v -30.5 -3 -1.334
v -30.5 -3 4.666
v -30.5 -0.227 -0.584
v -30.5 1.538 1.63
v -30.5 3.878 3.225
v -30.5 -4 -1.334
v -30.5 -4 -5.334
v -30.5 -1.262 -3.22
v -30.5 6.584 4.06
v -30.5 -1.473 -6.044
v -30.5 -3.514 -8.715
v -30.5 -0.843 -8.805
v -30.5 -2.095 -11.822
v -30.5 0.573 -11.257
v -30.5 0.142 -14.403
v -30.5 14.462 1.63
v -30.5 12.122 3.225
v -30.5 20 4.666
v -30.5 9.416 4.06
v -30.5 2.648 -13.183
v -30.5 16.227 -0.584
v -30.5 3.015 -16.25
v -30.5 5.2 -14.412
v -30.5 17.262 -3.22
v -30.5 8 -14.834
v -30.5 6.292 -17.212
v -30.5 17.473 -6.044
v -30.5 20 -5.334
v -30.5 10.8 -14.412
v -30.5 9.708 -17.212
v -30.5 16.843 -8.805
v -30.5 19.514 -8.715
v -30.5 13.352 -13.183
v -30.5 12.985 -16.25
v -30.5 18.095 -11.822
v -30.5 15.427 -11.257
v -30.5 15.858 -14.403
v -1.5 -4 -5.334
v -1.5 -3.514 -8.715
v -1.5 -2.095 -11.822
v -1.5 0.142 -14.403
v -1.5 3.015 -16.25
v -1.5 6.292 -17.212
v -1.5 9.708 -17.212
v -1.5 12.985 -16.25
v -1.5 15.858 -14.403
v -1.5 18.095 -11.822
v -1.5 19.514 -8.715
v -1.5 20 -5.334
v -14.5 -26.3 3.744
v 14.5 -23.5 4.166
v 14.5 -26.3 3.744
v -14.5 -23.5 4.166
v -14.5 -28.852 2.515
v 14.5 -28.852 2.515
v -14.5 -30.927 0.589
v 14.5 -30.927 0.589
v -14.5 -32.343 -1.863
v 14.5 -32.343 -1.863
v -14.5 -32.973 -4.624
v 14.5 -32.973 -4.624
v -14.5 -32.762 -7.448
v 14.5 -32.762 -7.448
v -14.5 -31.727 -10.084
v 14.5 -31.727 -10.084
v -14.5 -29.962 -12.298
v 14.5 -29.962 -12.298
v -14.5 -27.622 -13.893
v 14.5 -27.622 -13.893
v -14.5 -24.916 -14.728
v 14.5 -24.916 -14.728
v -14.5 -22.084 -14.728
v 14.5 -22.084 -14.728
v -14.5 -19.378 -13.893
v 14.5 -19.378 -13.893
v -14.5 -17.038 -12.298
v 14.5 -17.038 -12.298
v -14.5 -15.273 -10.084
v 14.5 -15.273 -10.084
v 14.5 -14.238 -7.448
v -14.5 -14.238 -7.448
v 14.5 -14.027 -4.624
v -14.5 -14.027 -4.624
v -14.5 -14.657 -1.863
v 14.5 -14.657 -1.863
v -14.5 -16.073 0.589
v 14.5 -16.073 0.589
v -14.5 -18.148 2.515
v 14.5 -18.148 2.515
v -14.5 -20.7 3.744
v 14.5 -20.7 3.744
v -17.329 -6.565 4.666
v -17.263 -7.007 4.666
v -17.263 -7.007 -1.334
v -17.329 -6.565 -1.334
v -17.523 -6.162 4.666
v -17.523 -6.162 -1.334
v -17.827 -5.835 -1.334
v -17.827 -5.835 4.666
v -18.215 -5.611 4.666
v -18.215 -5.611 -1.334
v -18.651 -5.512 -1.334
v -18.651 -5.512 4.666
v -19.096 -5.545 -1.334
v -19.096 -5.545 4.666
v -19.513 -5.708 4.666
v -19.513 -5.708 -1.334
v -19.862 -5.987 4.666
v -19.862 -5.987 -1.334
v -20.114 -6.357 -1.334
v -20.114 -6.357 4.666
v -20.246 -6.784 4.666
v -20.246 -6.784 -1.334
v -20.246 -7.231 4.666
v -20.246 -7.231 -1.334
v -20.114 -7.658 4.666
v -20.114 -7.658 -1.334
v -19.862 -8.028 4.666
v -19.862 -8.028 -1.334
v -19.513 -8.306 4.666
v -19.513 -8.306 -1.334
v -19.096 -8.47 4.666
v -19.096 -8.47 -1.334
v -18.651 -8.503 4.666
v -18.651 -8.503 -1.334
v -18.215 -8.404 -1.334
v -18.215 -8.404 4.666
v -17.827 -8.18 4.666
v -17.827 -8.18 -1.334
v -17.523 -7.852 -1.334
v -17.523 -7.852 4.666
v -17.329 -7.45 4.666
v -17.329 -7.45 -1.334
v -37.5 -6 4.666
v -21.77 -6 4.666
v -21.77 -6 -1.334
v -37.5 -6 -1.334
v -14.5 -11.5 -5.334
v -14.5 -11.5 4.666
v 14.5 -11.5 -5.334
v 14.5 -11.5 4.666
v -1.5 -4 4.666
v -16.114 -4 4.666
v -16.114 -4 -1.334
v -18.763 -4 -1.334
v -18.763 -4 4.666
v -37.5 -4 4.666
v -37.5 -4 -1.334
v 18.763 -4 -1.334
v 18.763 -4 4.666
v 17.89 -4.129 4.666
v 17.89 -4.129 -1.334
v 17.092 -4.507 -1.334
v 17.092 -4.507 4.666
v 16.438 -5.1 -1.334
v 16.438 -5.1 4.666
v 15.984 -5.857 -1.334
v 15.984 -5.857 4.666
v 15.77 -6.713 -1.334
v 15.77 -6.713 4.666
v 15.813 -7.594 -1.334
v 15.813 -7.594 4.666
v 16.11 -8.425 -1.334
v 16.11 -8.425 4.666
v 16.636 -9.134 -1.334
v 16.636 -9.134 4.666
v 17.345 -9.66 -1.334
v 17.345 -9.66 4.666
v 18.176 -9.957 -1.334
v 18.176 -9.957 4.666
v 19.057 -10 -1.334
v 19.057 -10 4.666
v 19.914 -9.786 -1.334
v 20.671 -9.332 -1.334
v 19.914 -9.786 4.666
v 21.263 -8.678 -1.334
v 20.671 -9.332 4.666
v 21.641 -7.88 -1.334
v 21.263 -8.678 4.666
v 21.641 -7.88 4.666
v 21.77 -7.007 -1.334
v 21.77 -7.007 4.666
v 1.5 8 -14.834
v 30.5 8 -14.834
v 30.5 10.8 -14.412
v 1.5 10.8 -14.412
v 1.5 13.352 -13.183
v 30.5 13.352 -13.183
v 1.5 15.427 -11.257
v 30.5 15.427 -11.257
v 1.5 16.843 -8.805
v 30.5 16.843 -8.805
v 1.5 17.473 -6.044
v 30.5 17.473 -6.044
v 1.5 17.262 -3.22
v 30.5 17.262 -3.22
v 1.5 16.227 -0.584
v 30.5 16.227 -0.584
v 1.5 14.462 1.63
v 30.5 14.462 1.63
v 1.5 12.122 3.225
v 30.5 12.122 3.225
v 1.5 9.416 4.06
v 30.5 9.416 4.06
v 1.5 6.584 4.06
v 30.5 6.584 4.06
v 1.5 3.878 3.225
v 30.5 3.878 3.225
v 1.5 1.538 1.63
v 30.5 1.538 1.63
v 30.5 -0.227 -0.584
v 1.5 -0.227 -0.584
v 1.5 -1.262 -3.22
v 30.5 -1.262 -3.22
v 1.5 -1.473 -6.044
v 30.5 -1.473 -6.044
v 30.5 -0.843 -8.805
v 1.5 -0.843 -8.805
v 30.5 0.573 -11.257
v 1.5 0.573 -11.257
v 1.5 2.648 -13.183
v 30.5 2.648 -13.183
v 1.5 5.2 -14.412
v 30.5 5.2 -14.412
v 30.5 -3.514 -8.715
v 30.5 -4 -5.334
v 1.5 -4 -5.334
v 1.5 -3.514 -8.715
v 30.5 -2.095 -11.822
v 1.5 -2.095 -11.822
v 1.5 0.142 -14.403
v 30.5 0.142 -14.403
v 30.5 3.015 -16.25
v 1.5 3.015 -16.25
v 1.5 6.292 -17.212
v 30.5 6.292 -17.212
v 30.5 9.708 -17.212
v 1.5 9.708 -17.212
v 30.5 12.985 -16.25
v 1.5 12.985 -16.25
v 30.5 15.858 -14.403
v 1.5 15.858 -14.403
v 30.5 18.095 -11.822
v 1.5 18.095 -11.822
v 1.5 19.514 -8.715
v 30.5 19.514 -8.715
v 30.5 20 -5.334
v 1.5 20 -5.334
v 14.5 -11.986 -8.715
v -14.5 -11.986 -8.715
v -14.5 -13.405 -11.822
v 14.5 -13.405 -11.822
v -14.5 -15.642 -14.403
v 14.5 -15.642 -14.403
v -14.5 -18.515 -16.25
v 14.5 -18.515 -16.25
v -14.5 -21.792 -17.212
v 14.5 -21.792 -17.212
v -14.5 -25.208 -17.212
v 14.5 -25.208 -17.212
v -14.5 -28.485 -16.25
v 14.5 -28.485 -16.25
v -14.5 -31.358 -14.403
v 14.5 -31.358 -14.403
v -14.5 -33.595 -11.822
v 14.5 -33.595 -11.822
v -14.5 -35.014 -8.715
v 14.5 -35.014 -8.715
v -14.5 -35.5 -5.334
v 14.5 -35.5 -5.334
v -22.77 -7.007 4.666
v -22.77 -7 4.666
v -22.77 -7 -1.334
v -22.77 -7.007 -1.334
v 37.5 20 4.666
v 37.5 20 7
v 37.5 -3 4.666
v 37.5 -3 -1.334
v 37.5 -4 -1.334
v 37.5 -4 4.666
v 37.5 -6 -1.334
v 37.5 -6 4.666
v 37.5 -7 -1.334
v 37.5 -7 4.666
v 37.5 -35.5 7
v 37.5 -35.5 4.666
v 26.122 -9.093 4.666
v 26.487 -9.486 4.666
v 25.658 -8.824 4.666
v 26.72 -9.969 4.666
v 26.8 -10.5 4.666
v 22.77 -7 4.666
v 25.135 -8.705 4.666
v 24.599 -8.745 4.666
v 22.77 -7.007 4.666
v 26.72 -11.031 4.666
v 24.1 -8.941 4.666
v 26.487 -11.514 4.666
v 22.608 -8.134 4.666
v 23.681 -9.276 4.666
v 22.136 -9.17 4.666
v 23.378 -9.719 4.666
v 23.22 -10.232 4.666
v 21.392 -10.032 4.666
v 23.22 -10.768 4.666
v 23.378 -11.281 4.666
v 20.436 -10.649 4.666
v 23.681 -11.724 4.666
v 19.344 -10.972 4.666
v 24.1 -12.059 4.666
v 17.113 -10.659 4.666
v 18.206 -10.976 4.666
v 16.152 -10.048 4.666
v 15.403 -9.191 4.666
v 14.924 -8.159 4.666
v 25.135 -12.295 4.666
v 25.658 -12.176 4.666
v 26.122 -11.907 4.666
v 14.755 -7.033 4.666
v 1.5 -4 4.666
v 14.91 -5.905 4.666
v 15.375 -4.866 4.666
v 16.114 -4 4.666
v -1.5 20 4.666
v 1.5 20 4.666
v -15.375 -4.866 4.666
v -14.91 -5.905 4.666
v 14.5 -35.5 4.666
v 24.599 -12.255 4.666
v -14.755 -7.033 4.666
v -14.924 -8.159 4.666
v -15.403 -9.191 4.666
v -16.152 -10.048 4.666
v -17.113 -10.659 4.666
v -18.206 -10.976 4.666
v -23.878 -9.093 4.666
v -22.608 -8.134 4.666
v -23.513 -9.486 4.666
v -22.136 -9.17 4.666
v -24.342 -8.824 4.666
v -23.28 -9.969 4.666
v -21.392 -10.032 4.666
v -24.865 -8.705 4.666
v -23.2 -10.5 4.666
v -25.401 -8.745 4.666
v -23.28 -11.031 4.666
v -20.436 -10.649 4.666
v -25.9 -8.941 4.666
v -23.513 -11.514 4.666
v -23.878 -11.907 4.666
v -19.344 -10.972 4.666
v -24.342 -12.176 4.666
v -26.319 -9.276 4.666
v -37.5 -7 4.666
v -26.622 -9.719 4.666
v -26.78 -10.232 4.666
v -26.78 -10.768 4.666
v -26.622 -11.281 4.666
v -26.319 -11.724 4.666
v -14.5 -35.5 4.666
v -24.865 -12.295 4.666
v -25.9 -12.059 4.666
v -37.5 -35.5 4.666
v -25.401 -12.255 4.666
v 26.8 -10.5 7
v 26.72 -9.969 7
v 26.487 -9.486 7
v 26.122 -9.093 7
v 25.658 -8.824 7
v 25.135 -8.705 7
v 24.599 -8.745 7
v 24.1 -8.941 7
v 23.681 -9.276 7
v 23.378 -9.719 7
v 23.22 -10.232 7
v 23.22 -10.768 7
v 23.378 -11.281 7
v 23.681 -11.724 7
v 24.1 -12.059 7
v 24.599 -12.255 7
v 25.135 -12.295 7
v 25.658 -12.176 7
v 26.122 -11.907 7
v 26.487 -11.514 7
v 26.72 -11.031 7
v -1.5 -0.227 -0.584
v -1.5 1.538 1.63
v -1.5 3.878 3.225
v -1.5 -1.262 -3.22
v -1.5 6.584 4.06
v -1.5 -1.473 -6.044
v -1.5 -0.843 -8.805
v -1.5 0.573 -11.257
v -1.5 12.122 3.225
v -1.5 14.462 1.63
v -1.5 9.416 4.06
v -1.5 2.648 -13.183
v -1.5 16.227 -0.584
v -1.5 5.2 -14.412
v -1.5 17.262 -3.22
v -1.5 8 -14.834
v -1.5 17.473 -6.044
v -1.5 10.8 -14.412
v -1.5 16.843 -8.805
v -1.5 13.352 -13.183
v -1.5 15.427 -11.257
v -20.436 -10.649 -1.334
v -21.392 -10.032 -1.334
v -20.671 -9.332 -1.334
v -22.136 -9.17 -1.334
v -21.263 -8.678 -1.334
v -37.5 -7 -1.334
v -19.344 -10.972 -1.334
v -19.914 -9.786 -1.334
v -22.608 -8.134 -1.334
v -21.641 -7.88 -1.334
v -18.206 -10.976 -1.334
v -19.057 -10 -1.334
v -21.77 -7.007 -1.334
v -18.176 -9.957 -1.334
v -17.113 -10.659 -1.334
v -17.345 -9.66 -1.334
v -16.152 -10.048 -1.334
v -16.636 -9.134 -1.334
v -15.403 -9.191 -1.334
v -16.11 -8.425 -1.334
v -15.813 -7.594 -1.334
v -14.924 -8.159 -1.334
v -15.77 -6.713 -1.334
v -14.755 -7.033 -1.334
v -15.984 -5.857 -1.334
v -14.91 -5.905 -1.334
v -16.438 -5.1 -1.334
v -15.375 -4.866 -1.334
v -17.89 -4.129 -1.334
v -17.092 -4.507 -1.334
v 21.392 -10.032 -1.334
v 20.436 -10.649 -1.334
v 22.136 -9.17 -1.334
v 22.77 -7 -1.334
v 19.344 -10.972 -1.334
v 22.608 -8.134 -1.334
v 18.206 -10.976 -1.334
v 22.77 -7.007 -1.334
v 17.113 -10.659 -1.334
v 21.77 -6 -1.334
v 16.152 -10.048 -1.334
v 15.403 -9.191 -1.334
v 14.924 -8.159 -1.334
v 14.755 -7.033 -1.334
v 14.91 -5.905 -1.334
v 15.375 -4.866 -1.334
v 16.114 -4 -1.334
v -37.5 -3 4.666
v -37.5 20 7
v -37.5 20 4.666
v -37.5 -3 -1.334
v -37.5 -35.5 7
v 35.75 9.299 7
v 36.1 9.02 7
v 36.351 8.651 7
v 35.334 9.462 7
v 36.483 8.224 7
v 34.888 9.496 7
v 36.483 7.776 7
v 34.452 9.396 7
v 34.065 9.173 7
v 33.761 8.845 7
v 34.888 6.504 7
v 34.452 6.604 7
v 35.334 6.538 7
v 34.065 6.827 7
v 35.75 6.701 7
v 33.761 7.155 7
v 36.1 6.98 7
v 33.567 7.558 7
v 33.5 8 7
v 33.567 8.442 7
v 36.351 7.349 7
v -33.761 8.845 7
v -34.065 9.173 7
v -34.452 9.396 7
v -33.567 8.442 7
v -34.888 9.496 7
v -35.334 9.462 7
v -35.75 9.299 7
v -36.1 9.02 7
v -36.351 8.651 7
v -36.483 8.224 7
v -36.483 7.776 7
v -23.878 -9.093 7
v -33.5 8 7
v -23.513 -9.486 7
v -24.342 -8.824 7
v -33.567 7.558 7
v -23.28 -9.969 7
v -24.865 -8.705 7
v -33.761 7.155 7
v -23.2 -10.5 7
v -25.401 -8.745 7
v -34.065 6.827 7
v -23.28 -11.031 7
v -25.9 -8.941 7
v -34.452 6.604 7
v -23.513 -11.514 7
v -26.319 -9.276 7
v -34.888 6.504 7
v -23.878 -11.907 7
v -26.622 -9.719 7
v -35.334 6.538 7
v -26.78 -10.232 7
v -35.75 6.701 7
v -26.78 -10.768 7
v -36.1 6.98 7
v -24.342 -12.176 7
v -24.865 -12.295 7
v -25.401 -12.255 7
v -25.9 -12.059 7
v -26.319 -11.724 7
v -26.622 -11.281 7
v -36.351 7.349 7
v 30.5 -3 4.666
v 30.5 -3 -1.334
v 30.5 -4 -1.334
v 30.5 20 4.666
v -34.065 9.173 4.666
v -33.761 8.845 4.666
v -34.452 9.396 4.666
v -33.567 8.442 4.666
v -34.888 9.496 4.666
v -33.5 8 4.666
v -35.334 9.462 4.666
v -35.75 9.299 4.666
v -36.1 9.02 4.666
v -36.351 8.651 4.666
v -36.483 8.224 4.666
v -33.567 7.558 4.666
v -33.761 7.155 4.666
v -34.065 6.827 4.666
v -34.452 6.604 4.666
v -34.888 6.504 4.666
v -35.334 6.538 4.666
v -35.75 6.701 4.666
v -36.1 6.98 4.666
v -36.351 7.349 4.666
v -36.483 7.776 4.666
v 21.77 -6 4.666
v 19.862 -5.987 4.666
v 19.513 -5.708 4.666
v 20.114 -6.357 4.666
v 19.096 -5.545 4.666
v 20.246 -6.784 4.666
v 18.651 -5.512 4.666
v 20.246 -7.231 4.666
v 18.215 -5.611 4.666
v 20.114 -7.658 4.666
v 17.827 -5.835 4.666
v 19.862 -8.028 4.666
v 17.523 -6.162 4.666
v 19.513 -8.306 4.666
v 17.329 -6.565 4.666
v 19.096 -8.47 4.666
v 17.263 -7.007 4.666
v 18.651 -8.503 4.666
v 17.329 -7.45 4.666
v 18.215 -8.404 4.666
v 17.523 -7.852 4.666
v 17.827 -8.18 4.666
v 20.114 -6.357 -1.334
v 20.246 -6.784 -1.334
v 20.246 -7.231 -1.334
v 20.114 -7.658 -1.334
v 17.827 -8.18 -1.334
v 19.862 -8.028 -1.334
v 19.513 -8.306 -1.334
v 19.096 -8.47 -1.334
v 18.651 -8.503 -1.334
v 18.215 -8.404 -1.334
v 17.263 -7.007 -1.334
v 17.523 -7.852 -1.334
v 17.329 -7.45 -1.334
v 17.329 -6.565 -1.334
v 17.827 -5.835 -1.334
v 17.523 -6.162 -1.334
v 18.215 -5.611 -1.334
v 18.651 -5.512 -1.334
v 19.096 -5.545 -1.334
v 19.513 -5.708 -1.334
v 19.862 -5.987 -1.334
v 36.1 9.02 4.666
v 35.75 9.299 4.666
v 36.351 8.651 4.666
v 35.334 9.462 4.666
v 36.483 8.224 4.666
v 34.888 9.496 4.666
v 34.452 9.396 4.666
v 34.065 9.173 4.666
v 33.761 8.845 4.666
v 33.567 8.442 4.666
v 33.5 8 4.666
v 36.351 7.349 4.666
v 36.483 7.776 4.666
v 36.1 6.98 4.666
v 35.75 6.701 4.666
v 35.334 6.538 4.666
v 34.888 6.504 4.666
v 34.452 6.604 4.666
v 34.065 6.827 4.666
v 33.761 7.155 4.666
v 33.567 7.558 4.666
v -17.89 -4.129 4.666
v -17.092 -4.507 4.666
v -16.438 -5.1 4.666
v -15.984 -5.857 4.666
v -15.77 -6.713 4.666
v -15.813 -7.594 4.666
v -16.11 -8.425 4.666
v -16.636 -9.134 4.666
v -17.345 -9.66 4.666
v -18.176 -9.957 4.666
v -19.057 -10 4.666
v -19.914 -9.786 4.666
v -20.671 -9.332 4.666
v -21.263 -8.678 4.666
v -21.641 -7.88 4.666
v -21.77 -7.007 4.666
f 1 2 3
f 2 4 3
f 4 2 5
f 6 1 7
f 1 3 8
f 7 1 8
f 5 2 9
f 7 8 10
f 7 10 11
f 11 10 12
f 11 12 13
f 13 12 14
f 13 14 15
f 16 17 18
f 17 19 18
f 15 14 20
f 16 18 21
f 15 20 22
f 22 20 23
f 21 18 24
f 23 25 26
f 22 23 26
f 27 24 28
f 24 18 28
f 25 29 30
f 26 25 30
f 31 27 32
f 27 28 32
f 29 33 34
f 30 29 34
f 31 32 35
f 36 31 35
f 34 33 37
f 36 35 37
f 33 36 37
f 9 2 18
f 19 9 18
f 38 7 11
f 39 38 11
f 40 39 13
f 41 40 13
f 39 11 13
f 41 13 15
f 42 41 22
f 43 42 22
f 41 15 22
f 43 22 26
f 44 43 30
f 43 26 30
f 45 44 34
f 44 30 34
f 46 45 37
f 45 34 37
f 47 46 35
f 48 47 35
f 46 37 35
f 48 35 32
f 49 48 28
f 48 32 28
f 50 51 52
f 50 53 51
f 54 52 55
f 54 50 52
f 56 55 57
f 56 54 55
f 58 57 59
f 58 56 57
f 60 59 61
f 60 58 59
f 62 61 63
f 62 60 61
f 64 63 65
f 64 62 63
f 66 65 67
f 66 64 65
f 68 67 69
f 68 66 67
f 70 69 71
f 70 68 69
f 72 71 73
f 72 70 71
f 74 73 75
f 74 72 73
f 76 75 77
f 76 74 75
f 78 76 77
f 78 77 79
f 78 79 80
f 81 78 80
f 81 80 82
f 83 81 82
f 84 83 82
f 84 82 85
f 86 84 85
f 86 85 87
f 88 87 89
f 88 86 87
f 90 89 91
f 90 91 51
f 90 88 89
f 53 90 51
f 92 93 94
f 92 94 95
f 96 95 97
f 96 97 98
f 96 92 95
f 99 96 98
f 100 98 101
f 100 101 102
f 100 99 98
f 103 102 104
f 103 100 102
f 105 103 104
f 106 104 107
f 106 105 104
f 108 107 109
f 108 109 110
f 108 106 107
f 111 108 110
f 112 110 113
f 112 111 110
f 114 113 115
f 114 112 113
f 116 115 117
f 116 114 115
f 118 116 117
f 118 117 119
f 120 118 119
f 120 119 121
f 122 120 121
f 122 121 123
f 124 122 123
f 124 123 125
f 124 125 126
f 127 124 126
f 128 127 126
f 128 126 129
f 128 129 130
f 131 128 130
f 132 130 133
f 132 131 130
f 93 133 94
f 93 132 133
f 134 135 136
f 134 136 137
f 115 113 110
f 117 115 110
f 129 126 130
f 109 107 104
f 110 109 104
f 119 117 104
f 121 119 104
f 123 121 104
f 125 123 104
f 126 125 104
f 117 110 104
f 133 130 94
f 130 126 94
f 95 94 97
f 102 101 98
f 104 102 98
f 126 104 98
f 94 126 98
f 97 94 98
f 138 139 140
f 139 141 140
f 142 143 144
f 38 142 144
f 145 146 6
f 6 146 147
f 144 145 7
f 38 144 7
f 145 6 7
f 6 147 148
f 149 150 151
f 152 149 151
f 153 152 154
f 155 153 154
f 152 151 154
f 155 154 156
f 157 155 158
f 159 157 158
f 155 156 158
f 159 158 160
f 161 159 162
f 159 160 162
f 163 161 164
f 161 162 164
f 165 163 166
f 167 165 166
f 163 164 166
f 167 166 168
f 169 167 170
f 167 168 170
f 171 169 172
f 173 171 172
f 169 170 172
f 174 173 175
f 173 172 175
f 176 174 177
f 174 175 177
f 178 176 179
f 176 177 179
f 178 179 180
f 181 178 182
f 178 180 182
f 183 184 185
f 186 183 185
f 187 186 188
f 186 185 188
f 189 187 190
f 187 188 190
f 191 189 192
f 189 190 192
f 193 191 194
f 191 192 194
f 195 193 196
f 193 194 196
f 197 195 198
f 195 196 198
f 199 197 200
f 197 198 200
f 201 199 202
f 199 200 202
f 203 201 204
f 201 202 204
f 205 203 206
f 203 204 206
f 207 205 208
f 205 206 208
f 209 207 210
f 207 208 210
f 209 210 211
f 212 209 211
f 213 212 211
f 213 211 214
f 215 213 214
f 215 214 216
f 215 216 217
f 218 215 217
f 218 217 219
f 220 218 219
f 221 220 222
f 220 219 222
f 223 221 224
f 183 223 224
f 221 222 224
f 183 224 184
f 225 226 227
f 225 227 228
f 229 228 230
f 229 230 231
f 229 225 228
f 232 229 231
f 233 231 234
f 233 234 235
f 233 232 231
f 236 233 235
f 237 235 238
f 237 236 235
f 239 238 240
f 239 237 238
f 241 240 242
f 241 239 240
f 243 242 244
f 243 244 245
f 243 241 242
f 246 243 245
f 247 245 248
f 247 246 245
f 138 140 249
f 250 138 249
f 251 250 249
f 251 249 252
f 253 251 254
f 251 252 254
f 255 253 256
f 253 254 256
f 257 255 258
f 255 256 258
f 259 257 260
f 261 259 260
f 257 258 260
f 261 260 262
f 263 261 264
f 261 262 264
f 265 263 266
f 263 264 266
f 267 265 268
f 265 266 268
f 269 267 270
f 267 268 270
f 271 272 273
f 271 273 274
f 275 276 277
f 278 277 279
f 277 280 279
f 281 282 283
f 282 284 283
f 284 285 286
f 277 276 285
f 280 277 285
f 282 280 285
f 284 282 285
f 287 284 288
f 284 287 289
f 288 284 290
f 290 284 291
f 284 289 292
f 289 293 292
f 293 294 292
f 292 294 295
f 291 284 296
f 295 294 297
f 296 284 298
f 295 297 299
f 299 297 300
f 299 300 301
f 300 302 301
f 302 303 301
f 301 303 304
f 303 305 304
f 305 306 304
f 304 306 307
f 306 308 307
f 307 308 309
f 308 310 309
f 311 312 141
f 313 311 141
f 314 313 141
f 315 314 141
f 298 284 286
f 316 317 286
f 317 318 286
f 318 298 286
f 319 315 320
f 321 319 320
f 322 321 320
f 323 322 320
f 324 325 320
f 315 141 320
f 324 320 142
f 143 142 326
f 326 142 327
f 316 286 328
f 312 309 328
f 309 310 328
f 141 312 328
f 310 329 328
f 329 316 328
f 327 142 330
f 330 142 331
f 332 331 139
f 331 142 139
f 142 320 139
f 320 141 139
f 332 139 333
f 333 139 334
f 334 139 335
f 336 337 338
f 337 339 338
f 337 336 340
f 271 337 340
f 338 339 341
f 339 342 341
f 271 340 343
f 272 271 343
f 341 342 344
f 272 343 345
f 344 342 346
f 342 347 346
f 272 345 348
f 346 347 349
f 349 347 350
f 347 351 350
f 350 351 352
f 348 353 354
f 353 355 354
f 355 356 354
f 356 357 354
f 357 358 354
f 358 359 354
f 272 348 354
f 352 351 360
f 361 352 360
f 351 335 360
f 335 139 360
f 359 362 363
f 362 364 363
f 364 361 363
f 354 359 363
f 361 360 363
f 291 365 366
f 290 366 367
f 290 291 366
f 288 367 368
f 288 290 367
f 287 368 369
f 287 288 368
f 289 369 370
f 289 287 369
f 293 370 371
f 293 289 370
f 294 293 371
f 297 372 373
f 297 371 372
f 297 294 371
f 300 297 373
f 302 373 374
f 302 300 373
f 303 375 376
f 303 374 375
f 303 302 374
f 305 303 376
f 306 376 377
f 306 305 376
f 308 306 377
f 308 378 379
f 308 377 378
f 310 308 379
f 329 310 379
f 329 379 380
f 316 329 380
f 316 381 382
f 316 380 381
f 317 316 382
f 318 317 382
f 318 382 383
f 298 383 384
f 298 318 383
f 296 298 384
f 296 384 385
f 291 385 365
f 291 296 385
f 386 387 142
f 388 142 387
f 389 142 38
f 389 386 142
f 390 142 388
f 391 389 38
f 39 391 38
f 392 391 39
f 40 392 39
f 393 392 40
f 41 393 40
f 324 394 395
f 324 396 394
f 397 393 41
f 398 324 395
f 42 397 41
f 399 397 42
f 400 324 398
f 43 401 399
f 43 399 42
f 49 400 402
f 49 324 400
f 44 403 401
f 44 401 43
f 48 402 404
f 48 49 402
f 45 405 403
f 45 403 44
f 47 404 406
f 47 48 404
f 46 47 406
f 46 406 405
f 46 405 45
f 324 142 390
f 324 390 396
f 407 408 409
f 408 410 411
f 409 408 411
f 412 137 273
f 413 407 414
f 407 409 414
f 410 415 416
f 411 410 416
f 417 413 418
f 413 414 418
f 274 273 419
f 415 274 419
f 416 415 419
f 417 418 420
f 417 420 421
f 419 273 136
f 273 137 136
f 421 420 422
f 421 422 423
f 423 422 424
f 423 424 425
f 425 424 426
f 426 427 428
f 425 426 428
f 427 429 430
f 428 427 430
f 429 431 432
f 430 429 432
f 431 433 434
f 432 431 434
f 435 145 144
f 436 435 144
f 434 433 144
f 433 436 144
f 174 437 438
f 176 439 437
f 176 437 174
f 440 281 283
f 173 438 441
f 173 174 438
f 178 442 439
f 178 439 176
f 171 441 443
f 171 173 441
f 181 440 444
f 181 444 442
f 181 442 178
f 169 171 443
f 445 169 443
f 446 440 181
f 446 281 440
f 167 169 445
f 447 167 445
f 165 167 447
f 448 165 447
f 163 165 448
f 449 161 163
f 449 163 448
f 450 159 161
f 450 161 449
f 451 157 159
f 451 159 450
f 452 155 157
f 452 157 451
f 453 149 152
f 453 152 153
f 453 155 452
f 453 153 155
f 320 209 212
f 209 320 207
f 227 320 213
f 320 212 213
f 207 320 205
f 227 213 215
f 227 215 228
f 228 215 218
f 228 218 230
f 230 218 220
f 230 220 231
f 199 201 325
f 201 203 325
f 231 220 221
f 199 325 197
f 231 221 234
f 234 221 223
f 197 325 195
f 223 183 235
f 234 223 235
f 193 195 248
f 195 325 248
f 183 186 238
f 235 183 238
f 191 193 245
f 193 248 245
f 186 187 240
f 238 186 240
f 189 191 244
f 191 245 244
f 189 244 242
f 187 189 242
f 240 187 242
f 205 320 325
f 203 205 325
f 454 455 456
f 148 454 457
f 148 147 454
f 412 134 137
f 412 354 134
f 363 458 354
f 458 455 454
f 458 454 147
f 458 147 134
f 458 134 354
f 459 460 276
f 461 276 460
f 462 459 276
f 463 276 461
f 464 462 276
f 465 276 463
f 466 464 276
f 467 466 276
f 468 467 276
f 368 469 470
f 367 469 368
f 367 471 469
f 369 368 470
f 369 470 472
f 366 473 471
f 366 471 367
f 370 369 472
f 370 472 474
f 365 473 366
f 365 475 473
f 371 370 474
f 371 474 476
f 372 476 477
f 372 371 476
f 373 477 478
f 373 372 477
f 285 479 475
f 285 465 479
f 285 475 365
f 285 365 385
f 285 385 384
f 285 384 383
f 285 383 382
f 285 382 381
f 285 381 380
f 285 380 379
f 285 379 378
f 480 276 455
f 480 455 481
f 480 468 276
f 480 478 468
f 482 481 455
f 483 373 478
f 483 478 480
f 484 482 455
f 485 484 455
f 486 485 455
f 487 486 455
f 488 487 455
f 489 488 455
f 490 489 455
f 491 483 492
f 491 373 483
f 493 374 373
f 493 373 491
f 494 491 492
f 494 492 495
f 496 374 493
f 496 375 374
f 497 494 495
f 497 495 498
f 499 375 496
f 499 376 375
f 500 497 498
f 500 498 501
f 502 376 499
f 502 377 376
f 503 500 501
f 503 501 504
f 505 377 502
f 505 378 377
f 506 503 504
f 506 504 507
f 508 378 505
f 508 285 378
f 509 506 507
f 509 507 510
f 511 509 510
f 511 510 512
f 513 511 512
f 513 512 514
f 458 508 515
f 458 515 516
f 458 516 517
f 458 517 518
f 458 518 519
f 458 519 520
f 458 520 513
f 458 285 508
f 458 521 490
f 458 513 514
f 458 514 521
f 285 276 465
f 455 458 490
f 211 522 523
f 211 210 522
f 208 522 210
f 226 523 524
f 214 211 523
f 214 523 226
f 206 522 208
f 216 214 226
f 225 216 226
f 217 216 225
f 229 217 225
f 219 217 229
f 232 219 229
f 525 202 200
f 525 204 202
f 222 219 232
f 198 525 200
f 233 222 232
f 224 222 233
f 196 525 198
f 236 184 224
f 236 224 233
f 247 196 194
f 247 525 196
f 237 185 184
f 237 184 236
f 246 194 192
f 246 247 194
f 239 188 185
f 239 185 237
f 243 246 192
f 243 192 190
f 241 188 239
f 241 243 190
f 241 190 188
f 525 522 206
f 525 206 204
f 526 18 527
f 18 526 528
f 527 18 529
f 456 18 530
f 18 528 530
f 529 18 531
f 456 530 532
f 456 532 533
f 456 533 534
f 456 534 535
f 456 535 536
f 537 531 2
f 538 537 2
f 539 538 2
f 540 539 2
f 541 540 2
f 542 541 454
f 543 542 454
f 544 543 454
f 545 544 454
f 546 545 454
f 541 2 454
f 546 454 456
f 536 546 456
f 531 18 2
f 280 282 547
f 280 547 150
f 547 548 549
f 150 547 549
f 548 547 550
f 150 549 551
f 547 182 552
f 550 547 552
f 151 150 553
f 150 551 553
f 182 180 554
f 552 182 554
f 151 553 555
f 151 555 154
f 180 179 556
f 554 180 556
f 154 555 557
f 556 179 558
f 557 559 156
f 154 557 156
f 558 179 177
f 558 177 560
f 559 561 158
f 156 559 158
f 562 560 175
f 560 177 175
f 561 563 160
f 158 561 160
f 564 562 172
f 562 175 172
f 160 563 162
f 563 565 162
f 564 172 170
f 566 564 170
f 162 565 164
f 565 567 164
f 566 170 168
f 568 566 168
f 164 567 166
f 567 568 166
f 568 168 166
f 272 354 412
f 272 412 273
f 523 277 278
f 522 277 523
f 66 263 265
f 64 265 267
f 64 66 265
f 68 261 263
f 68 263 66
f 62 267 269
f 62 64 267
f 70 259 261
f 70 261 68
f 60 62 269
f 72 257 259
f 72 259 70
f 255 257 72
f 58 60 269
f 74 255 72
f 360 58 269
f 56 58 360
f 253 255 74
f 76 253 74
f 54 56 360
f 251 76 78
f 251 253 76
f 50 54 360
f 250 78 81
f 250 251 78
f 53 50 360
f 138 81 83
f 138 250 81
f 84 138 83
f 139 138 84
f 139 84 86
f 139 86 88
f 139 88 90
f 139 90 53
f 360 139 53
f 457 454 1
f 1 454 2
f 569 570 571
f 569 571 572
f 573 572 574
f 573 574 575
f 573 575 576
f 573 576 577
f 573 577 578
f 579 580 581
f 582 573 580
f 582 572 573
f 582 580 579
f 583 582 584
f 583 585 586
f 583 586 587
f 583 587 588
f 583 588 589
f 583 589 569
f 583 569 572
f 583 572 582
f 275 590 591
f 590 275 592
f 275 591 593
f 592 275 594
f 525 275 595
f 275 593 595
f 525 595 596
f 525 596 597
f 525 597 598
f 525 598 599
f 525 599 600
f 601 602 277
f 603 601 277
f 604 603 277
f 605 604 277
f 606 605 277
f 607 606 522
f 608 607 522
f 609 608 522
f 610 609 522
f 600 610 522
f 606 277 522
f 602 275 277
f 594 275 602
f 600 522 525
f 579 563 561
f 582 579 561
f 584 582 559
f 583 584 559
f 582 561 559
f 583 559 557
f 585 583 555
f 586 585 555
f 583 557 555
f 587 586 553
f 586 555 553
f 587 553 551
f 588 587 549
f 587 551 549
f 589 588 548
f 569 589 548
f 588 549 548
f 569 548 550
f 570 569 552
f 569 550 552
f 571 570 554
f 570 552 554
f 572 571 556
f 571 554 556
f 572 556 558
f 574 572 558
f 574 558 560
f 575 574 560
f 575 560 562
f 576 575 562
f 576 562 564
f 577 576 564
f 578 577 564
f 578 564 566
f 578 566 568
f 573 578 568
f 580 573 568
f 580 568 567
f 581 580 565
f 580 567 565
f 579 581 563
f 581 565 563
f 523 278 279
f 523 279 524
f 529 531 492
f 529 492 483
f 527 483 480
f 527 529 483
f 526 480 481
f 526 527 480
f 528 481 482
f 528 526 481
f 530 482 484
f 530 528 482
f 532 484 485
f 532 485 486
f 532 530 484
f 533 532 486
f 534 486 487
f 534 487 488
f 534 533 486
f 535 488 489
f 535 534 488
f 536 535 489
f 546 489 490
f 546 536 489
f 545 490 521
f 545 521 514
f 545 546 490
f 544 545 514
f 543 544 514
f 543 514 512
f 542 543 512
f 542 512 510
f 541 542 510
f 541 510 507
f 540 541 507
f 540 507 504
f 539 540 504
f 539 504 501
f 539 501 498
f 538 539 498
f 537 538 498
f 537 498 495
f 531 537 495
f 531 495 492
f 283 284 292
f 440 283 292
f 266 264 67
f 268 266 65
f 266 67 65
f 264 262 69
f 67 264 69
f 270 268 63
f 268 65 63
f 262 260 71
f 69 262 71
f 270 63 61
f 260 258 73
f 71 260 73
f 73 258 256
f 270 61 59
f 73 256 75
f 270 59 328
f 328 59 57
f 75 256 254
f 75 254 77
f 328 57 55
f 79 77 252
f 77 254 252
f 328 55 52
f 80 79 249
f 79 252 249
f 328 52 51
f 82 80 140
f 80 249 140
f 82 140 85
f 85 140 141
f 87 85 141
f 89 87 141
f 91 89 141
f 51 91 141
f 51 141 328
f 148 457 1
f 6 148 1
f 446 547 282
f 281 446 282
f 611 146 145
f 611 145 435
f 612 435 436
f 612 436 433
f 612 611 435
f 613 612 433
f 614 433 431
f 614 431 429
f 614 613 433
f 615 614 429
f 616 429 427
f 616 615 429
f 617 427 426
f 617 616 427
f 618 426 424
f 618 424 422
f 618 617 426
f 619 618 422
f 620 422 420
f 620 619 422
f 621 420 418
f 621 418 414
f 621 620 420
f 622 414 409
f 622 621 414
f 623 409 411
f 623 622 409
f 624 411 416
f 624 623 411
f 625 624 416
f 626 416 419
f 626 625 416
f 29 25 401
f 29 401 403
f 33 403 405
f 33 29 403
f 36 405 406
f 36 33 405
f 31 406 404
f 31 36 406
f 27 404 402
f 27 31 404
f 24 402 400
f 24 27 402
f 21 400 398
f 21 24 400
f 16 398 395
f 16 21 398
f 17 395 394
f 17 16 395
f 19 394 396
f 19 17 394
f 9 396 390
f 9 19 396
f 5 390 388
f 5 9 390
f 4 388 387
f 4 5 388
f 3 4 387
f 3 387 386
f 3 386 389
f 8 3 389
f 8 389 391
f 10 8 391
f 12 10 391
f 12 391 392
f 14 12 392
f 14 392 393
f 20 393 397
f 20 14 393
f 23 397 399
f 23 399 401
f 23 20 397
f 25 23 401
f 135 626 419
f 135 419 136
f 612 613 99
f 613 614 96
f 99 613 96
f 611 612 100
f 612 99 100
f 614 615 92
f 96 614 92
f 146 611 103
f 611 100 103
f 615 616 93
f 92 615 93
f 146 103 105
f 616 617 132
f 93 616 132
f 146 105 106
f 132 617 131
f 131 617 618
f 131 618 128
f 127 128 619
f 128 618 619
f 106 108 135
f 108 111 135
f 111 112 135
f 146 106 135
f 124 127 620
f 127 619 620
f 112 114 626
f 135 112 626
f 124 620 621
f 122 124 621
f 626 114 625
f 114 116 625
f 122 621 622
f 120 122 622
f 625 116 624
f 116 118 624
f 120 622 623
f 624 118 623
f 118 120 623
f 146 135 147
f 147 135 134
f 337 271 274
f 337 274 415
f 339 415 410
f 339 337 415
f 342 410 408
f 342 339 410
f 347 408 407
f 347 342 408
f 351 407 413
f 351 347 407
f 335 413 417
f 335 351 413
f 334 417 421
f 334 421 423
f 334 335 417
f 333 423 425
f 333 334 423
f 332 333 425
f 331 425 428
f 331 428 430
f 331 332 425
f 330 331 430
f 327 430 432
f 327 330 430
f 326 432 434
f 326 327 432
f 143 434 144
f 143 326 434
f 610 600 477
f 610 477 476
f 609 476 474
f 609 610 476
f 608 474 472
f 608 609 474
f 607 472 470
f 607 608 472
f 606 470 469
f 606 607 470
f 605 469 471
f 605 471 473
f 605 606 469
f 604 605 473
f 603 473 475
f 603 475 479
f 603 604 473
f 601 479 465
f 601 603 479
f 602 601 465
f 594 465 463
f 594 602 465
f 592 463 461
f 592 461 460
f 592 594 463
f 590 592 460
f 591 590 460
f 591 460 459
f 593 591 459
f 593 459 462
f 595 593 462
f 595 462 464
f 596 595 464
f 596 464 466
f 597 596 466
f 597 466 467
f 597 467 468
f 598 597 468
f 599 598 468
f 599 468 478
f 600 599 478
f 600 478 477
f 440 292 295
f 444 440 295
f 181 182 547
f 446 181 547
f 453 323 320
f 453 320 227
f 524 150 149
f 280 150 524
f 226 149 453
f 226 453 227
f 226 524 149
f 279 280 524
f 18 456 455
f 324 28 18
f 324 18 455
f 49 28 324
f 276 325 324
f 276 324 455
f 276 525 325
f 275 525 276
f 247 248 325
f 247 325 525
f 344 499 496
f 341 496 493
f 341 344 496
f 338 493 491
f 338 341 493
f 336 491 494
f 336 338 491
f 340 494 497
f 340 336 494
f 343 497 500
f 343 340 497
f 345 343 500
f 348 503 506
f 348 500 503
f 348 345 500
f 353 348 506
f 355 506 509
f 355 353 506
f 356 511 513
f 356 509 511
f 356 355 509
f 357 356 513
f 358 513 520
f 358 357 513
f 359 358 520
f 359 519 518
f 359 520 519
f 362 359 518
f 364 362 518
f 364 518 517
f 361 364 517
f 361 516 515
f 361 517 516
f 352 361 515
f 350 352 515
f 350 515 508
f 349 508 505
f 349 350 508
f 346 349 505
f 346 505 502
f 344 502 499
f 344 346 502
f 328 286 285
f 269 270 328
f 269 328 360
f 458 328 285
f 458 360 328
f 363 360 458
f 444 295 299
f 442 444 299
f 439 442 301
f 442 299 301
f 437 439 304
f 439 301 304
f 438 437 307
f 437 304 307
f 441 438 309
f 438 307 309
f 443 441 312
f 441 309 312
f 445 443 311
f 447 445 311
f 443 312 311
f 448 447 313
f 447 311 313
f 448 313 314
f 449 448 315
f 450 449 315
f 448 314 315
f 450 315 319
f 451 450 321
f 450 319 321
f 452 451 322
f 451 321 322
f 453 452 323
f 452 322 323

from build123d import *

# Parameters (mm, degrees)
SKETCH1_R              = 1.79994
SKETCH1_R_2            = 1.5
BOSS_EXTRUDE1_DEPTH    = 7
SKETCH2_W              = 75
SKETCH2_H              = 13.099999962
SKETCH2_R              = 2.6999438
SKETCH2_R_2            = 2.499995
SKETCH2_R_3            = 1.3498449
BOSS_EXTRUDE2_DEPTH    = 6.987999994
SKETCH2_3_R            = 2.6999438
SKETCH2_3_R_2          = 1.3498449
CUT_EXTRUDE1_DEPTH     = 2.5
SKETCH5_W              = 75
SKETCH5_H              = 13.099999962
CUT_EXTRUDE3_DEPTH     = 21.082
SKETCH6_W              = 75
SKETCH6_H              = 7
BOSS_EXTRUDE3_DEPTH    = 9.5
SKETCH8_W              = 75
SKETCH8_H              = 38.030205227
CUT_EXTRUDE4_DEPTH     = 4.666
SKETCH10_W             = 75
SKETCH10_H             = 2.334
BOSS_EXTRUDE5_DEPTH    = 25.000000038
SKETCH11_R             = 1.79994
CUT_EXTRUDE5_DEPTH     = 5
SKETCH15_W             = 44.653530321
SKETCH15_H             = 13.617301916
SKETCH15_W_2           = 11.728266088
SKETCH15_H_2           = 5.987537529
BOSS_EXTRUDE7_DEPTH    = 2.334
SKETCH16_R             = 9.5
BOSS_EXTRUDE9_DEPTH    = 29
SKETCH17_R             = 9.5
BOSS_EXTRUDE11_DEPTH   = 14.5
SKETCH18_W             = 6.99999997
SKETCH18_H             = 1
BOSS_EXTRUDE12_DEPTH   = 6
BOSS_EXTRUDE12_2_DEPTH = 6
SKETCH18_R             = 1.5
BOSS_EXTRUDE12_3_DEPTH = 6


with BuildPart() as part:
    # Sketch1 → Boss-Extrude1 (new body)
    with BuildSketch(Plane.XY):
        with BuildLine():
            Line((37.5, -10.5), (30, -10.5))
            ThreePointArc((30, -10.5), (25, -15.5), (20, -10.5))
            Line((20, -10.5), (5, -10.5))
            ThreePointArc((5, -10.5), (0, -15.5), (-5, -10.5))
            Line((-5, -10.5), (-20, -10.5))
            ThreePointArc((-20, -10.5), (-25, -15.5), (-30, -10.5))
            Line((-30, -10.5), (-37.5, -10.5))
            Line((-37.5, -10.5), (-37.5, 10.5))
            Line((-37.5, 10.5), (37.5, 10.5))
            Line((37.5, 10.5), (37.5, -10.5))
        make_face()
        with Locations((-25, -10.5)):
            Circle(SKETCH1_R, mode=Mode.SUBTRACT)
        with Locations((0, -10.5)):
            Circle(SKETCH1_R, mode=Mode.SUBTRACT)
        with Locations((25, -10.5)):
            Circle(SKETCH1_R, mode=Mode.SUBTRACT)
        with Locations((-35, 8)):
            Circle(SKETCH1_R_2, mode=Mode.SUBTRACT)
        with Locations(Location((-15, 8, 0), (0, 0, 180))):
            Circle(SKETCH1_R_2, mode=Mode.SUBTRACT)
        with Locations((-10, 8)):
            Circle(SKETCH1_R_2, mode=Mode.SUBTRACT)
        with Locations(Location((10, 8, 0), (0, 0, 180))):
            Circle(SKETCH1_R_2, mode=Mode.SUBTRACT)
        with Locations(Location((35, 8, 0), (0, 0, 180))):
            Circle(SKETCH1_R_2, mode=Mode.SUBTRACT)
        with Locations((15, 8)):
            Circle(SKETCH1_R_2, mode=Mode.SUBTRACT)
    extrude(amount=BOSS_EXTRUDE1_DEPTH)

    # Sketch2 → Boss-Extrude2 (add)
    # profile 1 of 7: a face of its own
    with BuildSketch(Plane(origin=(0, 2.24999999, 0), x_dir=(1, 0, 0), z_dir=(0, 1, 0))):
        with Locations((0, -13.549999981)):
            Rectangle(SKETCH2_W, SKETCH2_H)
        with Locations((31.0001404, -13.549999981)):
            Circle(SKETCH2_R, mode=Mode.SUBTRACT)
        with Locations((-31.0001404, -13.549999981)):
            Circle(SKETCH2_R, mode=Mode.SUBTRACT)
        with Locations(Location((-25, -13.549999981, 0), (0, 0, 180))):
            Circle(SKETCH2_R_2, mode=Mode.SUBTRACT)
        with Locations((-6.0001404, -13.549999981)):
            Circle(SKETCH2_R, mode=Mode.SUBTRACT)
        with Locations((6.0001404, -13.549999981)):
            Circle(SKETCH2_R, mode=Mode.SUBTRACT)
        with Locations(Location((0, -13.549999981, 0), (0, 0, 180))):
            Circle(SKETCH2_R_2, mode=Mode.SUBTRACT)
        with Locations((-18.9998596, -13.549999981)):
            Circle(SKETCH2_R, mode=Mode.SUBTRACT)
        with Locations(Location((25, -13.549999981, 0), (0, 0, 180))):
            Circle(SKETCH2_R_2, mode=Mode.SUBTRACT)
        with Locations((18.9998596, -13.549999981)):
            Circle(SKETCH2_R, mode=Mode.SUBTRACT)
    # profile 2 of 7: a face of its own
    with BuildSketch(Plane(origin=(0, 2.24999999, 0), x_dir=(1, 0, 0), z_dir=(0, 1, 0))):
        with Locations((-31.0001404, -13.549999981)):
            Circle(SKETCH2_R)
        with Locations(Location((-31.0001404, -13.549999981, 0), (0, 0, 180))):
            Circle(SKETCH2_R_3, mode=Mode.SUBTRACT)
    # profile 3 of 7: a face of its own
    with BuildSketch(Plane(origin=(0, 2.24999999, 0), x_dir=(1, 0, 0), z_dir=(0, 1, 0))):
        with Locations((-18.9998596, -13.549999981)):
            Circle(SKETCH2_R)
        with Locations(Location((-18.9998596, -13.549999981, 0), (0, 0, 180))):
            Circle(SKETCH2_R_3, mode=Mode.SUBTRACT)
    # profile 4 of 7: a face of its own
    with BuildSketch(Plane(origin=(0, 2.24999999, 0), x_dir=(1, 0, 0), z_dir=(0, 1, 0))):
        with Locations((-6.0001404, -13.549999981)):
            Circle(SKETCH2_R)
        with Locations(Location((-6.0001404, -13.549999981, 0), (0, 0, 180))):
            Circle(SKETCH2_R_3, mode=Mode.SUBTRACT)
    # profile 5 of 7: a face of its own
    with BuildSketch(Plane(origin=(0, 2.24999999, 0), x_dir=(1, 0, 0), z_dir=(0, 1, 0))):
        with Locations((6.0001404, -13.549999981)):
            Circle(SKETCH2_R)
        with Locations(Location((6.0001404, -13.549999981, 0), (0, 0, 180))):
            Circle(SKETCH2_R_3, mode=Mode.SUBTRACT)
    # profile 6 of 7: a face of its own
    with BuildSketch(Plane(origin=(0, 2.24999999, 0), x_dir=(1, 0, 0), z_dir=(0, 1, 0))):
        with Locations((18.9998596, -13.549999981)):
            Circle(SKETCH2_R)
        with Locations(Location((18.9998596, -13.549999981, 0), (0, 0, 180))):
            Circle(SKETCH2_R_3, mode=Mode.SUBTRACT)
    # profile 7 of 7: a face of its own
    with BuildSketch(Plane(origin=(0, 2.24999999, 0), x_dir=(1, 0, 0), z_dir=(0, 1, 0))):
        with Locations((31.0001404, -13.549999981)):
            Circle(SKETCH2_R)
        with Locations(Location((31.0001404, -13.549999981, 0), (0, 0, 180))):
            Circle(SKETCH2_R_3, mode=Mode.SUBTRACT)
    extrude(amount=-BOSS_EXTRUDE2_DEPTH)

    # Sketch2<3> → Cut-Extrude1 (cut)
    # profile 1 of 6: a face of its own
    with BuildSketch(Plane(origin=(0, 2.24999999, 0), x_dir=(1, 0, 0), z_dir=(0, 1, 0))):
        with Locations(Location((-31.0001404, -13.549999981, 0), (0, 0, 180))):
            Circle(SKETCH2_3_R)
        with Locations(Location((-31.0001404, -13.549999981, 0), (0, 0, 180))):
            Circle(SKETCH2_3_R_2, mode=Mode.SUBTRACT)
    # profile 2 of 6: a face of its own
    with BuildSketch(Plane(origin=(0, 2.24999999, 0), x_dir=(1, 0, 0), z_dir=(0, 1, 0))):
        with Locations(Location((-18.9998596, -13.549999981, 0), (0, 0, 180))):
            Circle(SKETCH2_3_R)
        with Locations(Location((-18.9998596, -13.549999981, 0), (0, 0, 180))):
            Circle(SKETCH2_3_R_2, mode=Mode.SUBTRACT)
    # profile 3 of 6: a face of its own
    with BuildSketch(Plane(origin=(0, 2.24999999, 0), x_dir=(1, 0, 0), z_dir=(0, 1, 0))):
        with Locations(Location((-6.0001404, -13.549999981, 0), (0, 0, 180))):
            Circle(SKETCH2_3_R)
        with Locations(Location((-6.0001404, -13.549999981, 0), (0, 0, 180))):
            Circle(SKETCH2_3_R_2, mode=Mode.SUBTRACT)
    # profile 4 of 6: a face of its own
    with BuildSketch(Plane(origin=(0, 2.24999999, 0), x_dir=(1, 0, 0), z_dir=(0, 1, 0))):
        with Locations(Location((6.0001404, -13.549999981, 0), (0, 0, 180))):
            Circle(SKETCH2_3_R)
        with Locations(Location((6.0001404, -13.549999981, 0), (0, 0, 180))):
            Circle(SKETCH2_3_R_2, mode=Mode.SUBTRACT)
    # profile 5 of 6: a face of its own
    with BuildSketch(Plane(origin=(0, 2.24999999, 0), x_dir=(1, 0, 0), z_dir=(0, 1, 0))):
        with Locations(Location((18.9998596, -13.549999981, 0), (0, 0, 180))):
            Circle(SKETCH2_3_R)
        with Locations(Location((18.9998596, -13.549999981, 0), (0, 0, 180))):
            Circle(SKETCH2_3_R_2, mode=Mode.SUBTRACT)
    # profile 6 of 6: a face of its own
    with BuildSketch(Plane(origin=(0, 2.24999999, 0), x_dir=(1, 0, 0), z_dir=(0, 1, 0))):
        with Locations(Location((31.0001404, -13.549999981, 0), (0, 0, 180))):
            Circle(SKETCH2_3_R)
        with Locations(Location((31.0001404, -13.549999981, 0), (0, 0, 180))):
            Circle(SKETCH2_3_R_2, mode=Mode.SUBTRACT)
    extrude(amount=-CUT_EXTRUDE1_DEPTH, mode=Mode.SUBTRACT)

    # Sketch5 → Cut-Extrude3 (cut)
    with BuildSketch(Plane(origin=(0, 2.24999999, 0), x_dir=(1, 0, 0), z_dir=(0, 1, 0))):
        with Locations((0, -13.549999981)):
            Rectangle(SKETCH5_W, SKETCH5_H)
    extrude(amount=-CUT_EXTRUDE3_DEPTH, mode=Mode.SUBTRACT)

    # Sketch6 → Boss-Extrude3 (add)
    with BuildSketch(Plane(origin=(0, 10.5, 0), x_dir=(1, 0, 0), z_dir=(0, 1, 0))):
        with Locations((0, -3.5)):
            Rectangle(SKETCH6_W, SKETCH6_H)
    extrude(amount=BOSS_EXTRUDE3_DEPTH)

    # Sketch8 → Cut-Extrude4 (cut)
    with BuildSketch(Plane(origin=(0, 0, 0), x_dir=(-1, 0, 0), z_dir=(0, 0, -1))):
        with Locations((0, 0.984897387)):
            Rectangle(SKETCH8_W, SKETCH8_H)
    extrude(amount=-CUT_EXTRUDE4_DEPTH, mode=Mode.SUBTRACT)

    # Sketch10 → Boss-Extrude5 (add)
    with BuildSketch(Plane(origin=(0, -35.500000038, 0), x_dir=(-1, 0, 0), z_dir=(0, -1, 0))):
        with Locations((0, -5.833)):
            Rectangle(SKETCH10_W, SKETCH10_H)
    extrude(amount=-BOSS_EXTRUDE5_DEPTH)

    # Sketch11 → Cut-Extrude5 (cut)
    with BuildSketch(Plane(origin=(0, 0, 4.666), x_dir=(-1, 0, 0), z_dir=(0, 0, -1))):
        with Locations((-25, -10.5)):
            Circle(SKETCH11_R)
        with Locations((0, -10.5)):
            Circle(SKETCH11_R)
        with Locations((25, -10.5)):
            Circle(SKETCH11_R)
    extrude(amount=-CUT_EXTRUDE5_DEPTH, mode=Mode.SUBTRACT)

    # Sketch15 → Boss-Extrude7 (add)
    with BuildSketch(Plane.XY.offset(7)):
        with Locations((1.804442165, 8.803924913)):
            Rectangle(SKETCH15_W, SKETCH15_H)
        with Locations((-1.501191344, -11.287680254)):
            Rectangle(SKETCH15_W_2, SKETCH15_H_2)
    extrude(amount=-BOSS_EXTRUDE7_DEPTH)


with BuildPart() as body_2:
    # Sketch16 → Boss-Extrude9 (new body)
    with BuildSketch(Plane(origin=(30.50000003, 0, 0), x_dir=(0, 0, -1), z_dir=(1, 0, 0))):
        with BuildLine():
            Line((-4.666, 9.5), (-4.666, 6.5))
            Line((-4.666, 6.5), (-4.666, -4))
            Line((-4.666, -4), (5.334, -4))
            ThreePointArc((5.334, -4), (17.334, 8), (5.334, 20))
            Line((5.334, 20), (-4.666, 20))
            Line((-4.666, 20), (-4.666, 9.5))
        make_face()
        with Locations((5.334, 8)):
            Circle(SKETCH16_R, mode=Mode.SUBTRACT)
    extrude(amount=-BOSS_EXTRUDE9_DEPTH)


with BuildPart() as body_3:
    # Mirror1: mirrored copy
    add(body_2.part.mirror(Plane(origin=(0, 0, 0), x_dir=(0, 0, 1), z_dir=(1, 0, 0))))

    # Combine1: union body 2, part
    add(body_2.part)
    add(part.part)

    # Sketch17 → Boss-Extrude11 (add, symmetric)
    with BuildSketch(Plane(origin=(0, 0, 0), x_dir=(0, 0, -1), z_dir=(1, 0, 0))):
        with BuildLine():
            Line((5.334, -35.500000038), (-4.666, -35.500000038))
            Line((-4.666, -35.500000038), (-4.666, -11.500000038))
            Line((-4.666, -11.500000038), (5.334, -11.500000038))
            ThreePointArc((5.334, -11.500000038), (17.334, -23.500000038), (5.334, -35.500000038))
        make_face()
        with Locations(Location((5.334, -23.500000038, 0), (0, 0, 180))):
            Circle(SKETCH17_R, mode=Mode.SUBTRACT)
    extrude(amount=BOSS_EXTRUDE11_DEPTH, both=True)


with BuildPart() as body_2_2:
    # Sketch18 → Boss-Extrude12 (new body)
    with BuildSketch(Plane(origin=(0, 0, 4.666), x_dir=(-1, 0, 0), z_dir=(0, 0, -1))):
        with Locations((-34.000000015, -3.5)):
            Rectangle(SKETCH18_W, SKETCH18_H)
    extrude(amount=BOSS_EXTRUDE12_DEPTH)


with BuildPart() as body_3_2:
    # Sketch18 → Boss-Extrude12 2 (new body)
    with BuildSketch(Plane(origin=(0, 0, 4.666), x_dir=(-1, 0, 0), z_dir=(0, 0, -1))):
        with BuildLine():
            Line((-16.114044259, -4), (-18.762606579, -4))
            ThreePointArc((-18.762606579, -4), (-16.636024525, -9.134023236), (-21.770047761, -7.007441182))
            Line((-21.770047761, -7.007441182), (-21.770047761, -6))
            Line((-21.770047761, -6), (-37.5, -6))
            Line((-37.5, -6), (-37.5, -7))
            Line((-37.5, -7), (-22.770047761, -7))
            Line((-22.770047761, -7), (-22.770047761, -7.007441182))
            ThreePointArc((-22.770047761, -7.007441182), (-17.112511564, -10.659395628), (-16.114044259, -4))
        make_face()
    extrude(amount=BOSS_EXTRUDE12_2_DEPTH)


with BuildPart() as body_4:
    # Sketch18 → Boss-Extrude12 3 (new body)
    with BuildSketch(Plane(origin=(0, 0, 4.666), x_dir=(-1, 0, 0), z_dir=(0, 0, -1))):
        with Locations((-18.762606579, -7.007441182)):
            Circle(SKETCH18_R)
    extrude(amount=BOSS_EXTRUDE12_3_DEPTH)


with BuildPart() as body_5:
    # Mirror2: mirrored copy
    add(body_3_2.part.mirror(Plane(origin=(0, 0, 0), x_dir=(0, 0, 1), z_dir=(1, 0, 0))))


with BuildPart() as body_6:
    # Mirror2 2: mirrored copy
    add(body_4.part.mirror(Plane(origin=(0, 0, 0), x_dir=(0, 0, 1), z_dir=(1, 0, 0))))


with BuildPart() as body_7:
    # Mirror2 3: mirrored copy
    add(body_2_2.part.mirror(Plane(origin=(0, 0, 0), x_dir=(0, 0, 1), z_dir=(1, 0, 0))))


with BuildPart() as body_5_1:
    add(body_5.part)

    # Combine2: union body 7, body 2 2, body 4, body 3 2, body 3, body 6
    add(body_7.part)
    add(body_2_2.part)
    add(body_4.part)
    add(body_3_2.part)
    add(body_3.part)
    add(body_6.part)


solid = body_5_1.part
